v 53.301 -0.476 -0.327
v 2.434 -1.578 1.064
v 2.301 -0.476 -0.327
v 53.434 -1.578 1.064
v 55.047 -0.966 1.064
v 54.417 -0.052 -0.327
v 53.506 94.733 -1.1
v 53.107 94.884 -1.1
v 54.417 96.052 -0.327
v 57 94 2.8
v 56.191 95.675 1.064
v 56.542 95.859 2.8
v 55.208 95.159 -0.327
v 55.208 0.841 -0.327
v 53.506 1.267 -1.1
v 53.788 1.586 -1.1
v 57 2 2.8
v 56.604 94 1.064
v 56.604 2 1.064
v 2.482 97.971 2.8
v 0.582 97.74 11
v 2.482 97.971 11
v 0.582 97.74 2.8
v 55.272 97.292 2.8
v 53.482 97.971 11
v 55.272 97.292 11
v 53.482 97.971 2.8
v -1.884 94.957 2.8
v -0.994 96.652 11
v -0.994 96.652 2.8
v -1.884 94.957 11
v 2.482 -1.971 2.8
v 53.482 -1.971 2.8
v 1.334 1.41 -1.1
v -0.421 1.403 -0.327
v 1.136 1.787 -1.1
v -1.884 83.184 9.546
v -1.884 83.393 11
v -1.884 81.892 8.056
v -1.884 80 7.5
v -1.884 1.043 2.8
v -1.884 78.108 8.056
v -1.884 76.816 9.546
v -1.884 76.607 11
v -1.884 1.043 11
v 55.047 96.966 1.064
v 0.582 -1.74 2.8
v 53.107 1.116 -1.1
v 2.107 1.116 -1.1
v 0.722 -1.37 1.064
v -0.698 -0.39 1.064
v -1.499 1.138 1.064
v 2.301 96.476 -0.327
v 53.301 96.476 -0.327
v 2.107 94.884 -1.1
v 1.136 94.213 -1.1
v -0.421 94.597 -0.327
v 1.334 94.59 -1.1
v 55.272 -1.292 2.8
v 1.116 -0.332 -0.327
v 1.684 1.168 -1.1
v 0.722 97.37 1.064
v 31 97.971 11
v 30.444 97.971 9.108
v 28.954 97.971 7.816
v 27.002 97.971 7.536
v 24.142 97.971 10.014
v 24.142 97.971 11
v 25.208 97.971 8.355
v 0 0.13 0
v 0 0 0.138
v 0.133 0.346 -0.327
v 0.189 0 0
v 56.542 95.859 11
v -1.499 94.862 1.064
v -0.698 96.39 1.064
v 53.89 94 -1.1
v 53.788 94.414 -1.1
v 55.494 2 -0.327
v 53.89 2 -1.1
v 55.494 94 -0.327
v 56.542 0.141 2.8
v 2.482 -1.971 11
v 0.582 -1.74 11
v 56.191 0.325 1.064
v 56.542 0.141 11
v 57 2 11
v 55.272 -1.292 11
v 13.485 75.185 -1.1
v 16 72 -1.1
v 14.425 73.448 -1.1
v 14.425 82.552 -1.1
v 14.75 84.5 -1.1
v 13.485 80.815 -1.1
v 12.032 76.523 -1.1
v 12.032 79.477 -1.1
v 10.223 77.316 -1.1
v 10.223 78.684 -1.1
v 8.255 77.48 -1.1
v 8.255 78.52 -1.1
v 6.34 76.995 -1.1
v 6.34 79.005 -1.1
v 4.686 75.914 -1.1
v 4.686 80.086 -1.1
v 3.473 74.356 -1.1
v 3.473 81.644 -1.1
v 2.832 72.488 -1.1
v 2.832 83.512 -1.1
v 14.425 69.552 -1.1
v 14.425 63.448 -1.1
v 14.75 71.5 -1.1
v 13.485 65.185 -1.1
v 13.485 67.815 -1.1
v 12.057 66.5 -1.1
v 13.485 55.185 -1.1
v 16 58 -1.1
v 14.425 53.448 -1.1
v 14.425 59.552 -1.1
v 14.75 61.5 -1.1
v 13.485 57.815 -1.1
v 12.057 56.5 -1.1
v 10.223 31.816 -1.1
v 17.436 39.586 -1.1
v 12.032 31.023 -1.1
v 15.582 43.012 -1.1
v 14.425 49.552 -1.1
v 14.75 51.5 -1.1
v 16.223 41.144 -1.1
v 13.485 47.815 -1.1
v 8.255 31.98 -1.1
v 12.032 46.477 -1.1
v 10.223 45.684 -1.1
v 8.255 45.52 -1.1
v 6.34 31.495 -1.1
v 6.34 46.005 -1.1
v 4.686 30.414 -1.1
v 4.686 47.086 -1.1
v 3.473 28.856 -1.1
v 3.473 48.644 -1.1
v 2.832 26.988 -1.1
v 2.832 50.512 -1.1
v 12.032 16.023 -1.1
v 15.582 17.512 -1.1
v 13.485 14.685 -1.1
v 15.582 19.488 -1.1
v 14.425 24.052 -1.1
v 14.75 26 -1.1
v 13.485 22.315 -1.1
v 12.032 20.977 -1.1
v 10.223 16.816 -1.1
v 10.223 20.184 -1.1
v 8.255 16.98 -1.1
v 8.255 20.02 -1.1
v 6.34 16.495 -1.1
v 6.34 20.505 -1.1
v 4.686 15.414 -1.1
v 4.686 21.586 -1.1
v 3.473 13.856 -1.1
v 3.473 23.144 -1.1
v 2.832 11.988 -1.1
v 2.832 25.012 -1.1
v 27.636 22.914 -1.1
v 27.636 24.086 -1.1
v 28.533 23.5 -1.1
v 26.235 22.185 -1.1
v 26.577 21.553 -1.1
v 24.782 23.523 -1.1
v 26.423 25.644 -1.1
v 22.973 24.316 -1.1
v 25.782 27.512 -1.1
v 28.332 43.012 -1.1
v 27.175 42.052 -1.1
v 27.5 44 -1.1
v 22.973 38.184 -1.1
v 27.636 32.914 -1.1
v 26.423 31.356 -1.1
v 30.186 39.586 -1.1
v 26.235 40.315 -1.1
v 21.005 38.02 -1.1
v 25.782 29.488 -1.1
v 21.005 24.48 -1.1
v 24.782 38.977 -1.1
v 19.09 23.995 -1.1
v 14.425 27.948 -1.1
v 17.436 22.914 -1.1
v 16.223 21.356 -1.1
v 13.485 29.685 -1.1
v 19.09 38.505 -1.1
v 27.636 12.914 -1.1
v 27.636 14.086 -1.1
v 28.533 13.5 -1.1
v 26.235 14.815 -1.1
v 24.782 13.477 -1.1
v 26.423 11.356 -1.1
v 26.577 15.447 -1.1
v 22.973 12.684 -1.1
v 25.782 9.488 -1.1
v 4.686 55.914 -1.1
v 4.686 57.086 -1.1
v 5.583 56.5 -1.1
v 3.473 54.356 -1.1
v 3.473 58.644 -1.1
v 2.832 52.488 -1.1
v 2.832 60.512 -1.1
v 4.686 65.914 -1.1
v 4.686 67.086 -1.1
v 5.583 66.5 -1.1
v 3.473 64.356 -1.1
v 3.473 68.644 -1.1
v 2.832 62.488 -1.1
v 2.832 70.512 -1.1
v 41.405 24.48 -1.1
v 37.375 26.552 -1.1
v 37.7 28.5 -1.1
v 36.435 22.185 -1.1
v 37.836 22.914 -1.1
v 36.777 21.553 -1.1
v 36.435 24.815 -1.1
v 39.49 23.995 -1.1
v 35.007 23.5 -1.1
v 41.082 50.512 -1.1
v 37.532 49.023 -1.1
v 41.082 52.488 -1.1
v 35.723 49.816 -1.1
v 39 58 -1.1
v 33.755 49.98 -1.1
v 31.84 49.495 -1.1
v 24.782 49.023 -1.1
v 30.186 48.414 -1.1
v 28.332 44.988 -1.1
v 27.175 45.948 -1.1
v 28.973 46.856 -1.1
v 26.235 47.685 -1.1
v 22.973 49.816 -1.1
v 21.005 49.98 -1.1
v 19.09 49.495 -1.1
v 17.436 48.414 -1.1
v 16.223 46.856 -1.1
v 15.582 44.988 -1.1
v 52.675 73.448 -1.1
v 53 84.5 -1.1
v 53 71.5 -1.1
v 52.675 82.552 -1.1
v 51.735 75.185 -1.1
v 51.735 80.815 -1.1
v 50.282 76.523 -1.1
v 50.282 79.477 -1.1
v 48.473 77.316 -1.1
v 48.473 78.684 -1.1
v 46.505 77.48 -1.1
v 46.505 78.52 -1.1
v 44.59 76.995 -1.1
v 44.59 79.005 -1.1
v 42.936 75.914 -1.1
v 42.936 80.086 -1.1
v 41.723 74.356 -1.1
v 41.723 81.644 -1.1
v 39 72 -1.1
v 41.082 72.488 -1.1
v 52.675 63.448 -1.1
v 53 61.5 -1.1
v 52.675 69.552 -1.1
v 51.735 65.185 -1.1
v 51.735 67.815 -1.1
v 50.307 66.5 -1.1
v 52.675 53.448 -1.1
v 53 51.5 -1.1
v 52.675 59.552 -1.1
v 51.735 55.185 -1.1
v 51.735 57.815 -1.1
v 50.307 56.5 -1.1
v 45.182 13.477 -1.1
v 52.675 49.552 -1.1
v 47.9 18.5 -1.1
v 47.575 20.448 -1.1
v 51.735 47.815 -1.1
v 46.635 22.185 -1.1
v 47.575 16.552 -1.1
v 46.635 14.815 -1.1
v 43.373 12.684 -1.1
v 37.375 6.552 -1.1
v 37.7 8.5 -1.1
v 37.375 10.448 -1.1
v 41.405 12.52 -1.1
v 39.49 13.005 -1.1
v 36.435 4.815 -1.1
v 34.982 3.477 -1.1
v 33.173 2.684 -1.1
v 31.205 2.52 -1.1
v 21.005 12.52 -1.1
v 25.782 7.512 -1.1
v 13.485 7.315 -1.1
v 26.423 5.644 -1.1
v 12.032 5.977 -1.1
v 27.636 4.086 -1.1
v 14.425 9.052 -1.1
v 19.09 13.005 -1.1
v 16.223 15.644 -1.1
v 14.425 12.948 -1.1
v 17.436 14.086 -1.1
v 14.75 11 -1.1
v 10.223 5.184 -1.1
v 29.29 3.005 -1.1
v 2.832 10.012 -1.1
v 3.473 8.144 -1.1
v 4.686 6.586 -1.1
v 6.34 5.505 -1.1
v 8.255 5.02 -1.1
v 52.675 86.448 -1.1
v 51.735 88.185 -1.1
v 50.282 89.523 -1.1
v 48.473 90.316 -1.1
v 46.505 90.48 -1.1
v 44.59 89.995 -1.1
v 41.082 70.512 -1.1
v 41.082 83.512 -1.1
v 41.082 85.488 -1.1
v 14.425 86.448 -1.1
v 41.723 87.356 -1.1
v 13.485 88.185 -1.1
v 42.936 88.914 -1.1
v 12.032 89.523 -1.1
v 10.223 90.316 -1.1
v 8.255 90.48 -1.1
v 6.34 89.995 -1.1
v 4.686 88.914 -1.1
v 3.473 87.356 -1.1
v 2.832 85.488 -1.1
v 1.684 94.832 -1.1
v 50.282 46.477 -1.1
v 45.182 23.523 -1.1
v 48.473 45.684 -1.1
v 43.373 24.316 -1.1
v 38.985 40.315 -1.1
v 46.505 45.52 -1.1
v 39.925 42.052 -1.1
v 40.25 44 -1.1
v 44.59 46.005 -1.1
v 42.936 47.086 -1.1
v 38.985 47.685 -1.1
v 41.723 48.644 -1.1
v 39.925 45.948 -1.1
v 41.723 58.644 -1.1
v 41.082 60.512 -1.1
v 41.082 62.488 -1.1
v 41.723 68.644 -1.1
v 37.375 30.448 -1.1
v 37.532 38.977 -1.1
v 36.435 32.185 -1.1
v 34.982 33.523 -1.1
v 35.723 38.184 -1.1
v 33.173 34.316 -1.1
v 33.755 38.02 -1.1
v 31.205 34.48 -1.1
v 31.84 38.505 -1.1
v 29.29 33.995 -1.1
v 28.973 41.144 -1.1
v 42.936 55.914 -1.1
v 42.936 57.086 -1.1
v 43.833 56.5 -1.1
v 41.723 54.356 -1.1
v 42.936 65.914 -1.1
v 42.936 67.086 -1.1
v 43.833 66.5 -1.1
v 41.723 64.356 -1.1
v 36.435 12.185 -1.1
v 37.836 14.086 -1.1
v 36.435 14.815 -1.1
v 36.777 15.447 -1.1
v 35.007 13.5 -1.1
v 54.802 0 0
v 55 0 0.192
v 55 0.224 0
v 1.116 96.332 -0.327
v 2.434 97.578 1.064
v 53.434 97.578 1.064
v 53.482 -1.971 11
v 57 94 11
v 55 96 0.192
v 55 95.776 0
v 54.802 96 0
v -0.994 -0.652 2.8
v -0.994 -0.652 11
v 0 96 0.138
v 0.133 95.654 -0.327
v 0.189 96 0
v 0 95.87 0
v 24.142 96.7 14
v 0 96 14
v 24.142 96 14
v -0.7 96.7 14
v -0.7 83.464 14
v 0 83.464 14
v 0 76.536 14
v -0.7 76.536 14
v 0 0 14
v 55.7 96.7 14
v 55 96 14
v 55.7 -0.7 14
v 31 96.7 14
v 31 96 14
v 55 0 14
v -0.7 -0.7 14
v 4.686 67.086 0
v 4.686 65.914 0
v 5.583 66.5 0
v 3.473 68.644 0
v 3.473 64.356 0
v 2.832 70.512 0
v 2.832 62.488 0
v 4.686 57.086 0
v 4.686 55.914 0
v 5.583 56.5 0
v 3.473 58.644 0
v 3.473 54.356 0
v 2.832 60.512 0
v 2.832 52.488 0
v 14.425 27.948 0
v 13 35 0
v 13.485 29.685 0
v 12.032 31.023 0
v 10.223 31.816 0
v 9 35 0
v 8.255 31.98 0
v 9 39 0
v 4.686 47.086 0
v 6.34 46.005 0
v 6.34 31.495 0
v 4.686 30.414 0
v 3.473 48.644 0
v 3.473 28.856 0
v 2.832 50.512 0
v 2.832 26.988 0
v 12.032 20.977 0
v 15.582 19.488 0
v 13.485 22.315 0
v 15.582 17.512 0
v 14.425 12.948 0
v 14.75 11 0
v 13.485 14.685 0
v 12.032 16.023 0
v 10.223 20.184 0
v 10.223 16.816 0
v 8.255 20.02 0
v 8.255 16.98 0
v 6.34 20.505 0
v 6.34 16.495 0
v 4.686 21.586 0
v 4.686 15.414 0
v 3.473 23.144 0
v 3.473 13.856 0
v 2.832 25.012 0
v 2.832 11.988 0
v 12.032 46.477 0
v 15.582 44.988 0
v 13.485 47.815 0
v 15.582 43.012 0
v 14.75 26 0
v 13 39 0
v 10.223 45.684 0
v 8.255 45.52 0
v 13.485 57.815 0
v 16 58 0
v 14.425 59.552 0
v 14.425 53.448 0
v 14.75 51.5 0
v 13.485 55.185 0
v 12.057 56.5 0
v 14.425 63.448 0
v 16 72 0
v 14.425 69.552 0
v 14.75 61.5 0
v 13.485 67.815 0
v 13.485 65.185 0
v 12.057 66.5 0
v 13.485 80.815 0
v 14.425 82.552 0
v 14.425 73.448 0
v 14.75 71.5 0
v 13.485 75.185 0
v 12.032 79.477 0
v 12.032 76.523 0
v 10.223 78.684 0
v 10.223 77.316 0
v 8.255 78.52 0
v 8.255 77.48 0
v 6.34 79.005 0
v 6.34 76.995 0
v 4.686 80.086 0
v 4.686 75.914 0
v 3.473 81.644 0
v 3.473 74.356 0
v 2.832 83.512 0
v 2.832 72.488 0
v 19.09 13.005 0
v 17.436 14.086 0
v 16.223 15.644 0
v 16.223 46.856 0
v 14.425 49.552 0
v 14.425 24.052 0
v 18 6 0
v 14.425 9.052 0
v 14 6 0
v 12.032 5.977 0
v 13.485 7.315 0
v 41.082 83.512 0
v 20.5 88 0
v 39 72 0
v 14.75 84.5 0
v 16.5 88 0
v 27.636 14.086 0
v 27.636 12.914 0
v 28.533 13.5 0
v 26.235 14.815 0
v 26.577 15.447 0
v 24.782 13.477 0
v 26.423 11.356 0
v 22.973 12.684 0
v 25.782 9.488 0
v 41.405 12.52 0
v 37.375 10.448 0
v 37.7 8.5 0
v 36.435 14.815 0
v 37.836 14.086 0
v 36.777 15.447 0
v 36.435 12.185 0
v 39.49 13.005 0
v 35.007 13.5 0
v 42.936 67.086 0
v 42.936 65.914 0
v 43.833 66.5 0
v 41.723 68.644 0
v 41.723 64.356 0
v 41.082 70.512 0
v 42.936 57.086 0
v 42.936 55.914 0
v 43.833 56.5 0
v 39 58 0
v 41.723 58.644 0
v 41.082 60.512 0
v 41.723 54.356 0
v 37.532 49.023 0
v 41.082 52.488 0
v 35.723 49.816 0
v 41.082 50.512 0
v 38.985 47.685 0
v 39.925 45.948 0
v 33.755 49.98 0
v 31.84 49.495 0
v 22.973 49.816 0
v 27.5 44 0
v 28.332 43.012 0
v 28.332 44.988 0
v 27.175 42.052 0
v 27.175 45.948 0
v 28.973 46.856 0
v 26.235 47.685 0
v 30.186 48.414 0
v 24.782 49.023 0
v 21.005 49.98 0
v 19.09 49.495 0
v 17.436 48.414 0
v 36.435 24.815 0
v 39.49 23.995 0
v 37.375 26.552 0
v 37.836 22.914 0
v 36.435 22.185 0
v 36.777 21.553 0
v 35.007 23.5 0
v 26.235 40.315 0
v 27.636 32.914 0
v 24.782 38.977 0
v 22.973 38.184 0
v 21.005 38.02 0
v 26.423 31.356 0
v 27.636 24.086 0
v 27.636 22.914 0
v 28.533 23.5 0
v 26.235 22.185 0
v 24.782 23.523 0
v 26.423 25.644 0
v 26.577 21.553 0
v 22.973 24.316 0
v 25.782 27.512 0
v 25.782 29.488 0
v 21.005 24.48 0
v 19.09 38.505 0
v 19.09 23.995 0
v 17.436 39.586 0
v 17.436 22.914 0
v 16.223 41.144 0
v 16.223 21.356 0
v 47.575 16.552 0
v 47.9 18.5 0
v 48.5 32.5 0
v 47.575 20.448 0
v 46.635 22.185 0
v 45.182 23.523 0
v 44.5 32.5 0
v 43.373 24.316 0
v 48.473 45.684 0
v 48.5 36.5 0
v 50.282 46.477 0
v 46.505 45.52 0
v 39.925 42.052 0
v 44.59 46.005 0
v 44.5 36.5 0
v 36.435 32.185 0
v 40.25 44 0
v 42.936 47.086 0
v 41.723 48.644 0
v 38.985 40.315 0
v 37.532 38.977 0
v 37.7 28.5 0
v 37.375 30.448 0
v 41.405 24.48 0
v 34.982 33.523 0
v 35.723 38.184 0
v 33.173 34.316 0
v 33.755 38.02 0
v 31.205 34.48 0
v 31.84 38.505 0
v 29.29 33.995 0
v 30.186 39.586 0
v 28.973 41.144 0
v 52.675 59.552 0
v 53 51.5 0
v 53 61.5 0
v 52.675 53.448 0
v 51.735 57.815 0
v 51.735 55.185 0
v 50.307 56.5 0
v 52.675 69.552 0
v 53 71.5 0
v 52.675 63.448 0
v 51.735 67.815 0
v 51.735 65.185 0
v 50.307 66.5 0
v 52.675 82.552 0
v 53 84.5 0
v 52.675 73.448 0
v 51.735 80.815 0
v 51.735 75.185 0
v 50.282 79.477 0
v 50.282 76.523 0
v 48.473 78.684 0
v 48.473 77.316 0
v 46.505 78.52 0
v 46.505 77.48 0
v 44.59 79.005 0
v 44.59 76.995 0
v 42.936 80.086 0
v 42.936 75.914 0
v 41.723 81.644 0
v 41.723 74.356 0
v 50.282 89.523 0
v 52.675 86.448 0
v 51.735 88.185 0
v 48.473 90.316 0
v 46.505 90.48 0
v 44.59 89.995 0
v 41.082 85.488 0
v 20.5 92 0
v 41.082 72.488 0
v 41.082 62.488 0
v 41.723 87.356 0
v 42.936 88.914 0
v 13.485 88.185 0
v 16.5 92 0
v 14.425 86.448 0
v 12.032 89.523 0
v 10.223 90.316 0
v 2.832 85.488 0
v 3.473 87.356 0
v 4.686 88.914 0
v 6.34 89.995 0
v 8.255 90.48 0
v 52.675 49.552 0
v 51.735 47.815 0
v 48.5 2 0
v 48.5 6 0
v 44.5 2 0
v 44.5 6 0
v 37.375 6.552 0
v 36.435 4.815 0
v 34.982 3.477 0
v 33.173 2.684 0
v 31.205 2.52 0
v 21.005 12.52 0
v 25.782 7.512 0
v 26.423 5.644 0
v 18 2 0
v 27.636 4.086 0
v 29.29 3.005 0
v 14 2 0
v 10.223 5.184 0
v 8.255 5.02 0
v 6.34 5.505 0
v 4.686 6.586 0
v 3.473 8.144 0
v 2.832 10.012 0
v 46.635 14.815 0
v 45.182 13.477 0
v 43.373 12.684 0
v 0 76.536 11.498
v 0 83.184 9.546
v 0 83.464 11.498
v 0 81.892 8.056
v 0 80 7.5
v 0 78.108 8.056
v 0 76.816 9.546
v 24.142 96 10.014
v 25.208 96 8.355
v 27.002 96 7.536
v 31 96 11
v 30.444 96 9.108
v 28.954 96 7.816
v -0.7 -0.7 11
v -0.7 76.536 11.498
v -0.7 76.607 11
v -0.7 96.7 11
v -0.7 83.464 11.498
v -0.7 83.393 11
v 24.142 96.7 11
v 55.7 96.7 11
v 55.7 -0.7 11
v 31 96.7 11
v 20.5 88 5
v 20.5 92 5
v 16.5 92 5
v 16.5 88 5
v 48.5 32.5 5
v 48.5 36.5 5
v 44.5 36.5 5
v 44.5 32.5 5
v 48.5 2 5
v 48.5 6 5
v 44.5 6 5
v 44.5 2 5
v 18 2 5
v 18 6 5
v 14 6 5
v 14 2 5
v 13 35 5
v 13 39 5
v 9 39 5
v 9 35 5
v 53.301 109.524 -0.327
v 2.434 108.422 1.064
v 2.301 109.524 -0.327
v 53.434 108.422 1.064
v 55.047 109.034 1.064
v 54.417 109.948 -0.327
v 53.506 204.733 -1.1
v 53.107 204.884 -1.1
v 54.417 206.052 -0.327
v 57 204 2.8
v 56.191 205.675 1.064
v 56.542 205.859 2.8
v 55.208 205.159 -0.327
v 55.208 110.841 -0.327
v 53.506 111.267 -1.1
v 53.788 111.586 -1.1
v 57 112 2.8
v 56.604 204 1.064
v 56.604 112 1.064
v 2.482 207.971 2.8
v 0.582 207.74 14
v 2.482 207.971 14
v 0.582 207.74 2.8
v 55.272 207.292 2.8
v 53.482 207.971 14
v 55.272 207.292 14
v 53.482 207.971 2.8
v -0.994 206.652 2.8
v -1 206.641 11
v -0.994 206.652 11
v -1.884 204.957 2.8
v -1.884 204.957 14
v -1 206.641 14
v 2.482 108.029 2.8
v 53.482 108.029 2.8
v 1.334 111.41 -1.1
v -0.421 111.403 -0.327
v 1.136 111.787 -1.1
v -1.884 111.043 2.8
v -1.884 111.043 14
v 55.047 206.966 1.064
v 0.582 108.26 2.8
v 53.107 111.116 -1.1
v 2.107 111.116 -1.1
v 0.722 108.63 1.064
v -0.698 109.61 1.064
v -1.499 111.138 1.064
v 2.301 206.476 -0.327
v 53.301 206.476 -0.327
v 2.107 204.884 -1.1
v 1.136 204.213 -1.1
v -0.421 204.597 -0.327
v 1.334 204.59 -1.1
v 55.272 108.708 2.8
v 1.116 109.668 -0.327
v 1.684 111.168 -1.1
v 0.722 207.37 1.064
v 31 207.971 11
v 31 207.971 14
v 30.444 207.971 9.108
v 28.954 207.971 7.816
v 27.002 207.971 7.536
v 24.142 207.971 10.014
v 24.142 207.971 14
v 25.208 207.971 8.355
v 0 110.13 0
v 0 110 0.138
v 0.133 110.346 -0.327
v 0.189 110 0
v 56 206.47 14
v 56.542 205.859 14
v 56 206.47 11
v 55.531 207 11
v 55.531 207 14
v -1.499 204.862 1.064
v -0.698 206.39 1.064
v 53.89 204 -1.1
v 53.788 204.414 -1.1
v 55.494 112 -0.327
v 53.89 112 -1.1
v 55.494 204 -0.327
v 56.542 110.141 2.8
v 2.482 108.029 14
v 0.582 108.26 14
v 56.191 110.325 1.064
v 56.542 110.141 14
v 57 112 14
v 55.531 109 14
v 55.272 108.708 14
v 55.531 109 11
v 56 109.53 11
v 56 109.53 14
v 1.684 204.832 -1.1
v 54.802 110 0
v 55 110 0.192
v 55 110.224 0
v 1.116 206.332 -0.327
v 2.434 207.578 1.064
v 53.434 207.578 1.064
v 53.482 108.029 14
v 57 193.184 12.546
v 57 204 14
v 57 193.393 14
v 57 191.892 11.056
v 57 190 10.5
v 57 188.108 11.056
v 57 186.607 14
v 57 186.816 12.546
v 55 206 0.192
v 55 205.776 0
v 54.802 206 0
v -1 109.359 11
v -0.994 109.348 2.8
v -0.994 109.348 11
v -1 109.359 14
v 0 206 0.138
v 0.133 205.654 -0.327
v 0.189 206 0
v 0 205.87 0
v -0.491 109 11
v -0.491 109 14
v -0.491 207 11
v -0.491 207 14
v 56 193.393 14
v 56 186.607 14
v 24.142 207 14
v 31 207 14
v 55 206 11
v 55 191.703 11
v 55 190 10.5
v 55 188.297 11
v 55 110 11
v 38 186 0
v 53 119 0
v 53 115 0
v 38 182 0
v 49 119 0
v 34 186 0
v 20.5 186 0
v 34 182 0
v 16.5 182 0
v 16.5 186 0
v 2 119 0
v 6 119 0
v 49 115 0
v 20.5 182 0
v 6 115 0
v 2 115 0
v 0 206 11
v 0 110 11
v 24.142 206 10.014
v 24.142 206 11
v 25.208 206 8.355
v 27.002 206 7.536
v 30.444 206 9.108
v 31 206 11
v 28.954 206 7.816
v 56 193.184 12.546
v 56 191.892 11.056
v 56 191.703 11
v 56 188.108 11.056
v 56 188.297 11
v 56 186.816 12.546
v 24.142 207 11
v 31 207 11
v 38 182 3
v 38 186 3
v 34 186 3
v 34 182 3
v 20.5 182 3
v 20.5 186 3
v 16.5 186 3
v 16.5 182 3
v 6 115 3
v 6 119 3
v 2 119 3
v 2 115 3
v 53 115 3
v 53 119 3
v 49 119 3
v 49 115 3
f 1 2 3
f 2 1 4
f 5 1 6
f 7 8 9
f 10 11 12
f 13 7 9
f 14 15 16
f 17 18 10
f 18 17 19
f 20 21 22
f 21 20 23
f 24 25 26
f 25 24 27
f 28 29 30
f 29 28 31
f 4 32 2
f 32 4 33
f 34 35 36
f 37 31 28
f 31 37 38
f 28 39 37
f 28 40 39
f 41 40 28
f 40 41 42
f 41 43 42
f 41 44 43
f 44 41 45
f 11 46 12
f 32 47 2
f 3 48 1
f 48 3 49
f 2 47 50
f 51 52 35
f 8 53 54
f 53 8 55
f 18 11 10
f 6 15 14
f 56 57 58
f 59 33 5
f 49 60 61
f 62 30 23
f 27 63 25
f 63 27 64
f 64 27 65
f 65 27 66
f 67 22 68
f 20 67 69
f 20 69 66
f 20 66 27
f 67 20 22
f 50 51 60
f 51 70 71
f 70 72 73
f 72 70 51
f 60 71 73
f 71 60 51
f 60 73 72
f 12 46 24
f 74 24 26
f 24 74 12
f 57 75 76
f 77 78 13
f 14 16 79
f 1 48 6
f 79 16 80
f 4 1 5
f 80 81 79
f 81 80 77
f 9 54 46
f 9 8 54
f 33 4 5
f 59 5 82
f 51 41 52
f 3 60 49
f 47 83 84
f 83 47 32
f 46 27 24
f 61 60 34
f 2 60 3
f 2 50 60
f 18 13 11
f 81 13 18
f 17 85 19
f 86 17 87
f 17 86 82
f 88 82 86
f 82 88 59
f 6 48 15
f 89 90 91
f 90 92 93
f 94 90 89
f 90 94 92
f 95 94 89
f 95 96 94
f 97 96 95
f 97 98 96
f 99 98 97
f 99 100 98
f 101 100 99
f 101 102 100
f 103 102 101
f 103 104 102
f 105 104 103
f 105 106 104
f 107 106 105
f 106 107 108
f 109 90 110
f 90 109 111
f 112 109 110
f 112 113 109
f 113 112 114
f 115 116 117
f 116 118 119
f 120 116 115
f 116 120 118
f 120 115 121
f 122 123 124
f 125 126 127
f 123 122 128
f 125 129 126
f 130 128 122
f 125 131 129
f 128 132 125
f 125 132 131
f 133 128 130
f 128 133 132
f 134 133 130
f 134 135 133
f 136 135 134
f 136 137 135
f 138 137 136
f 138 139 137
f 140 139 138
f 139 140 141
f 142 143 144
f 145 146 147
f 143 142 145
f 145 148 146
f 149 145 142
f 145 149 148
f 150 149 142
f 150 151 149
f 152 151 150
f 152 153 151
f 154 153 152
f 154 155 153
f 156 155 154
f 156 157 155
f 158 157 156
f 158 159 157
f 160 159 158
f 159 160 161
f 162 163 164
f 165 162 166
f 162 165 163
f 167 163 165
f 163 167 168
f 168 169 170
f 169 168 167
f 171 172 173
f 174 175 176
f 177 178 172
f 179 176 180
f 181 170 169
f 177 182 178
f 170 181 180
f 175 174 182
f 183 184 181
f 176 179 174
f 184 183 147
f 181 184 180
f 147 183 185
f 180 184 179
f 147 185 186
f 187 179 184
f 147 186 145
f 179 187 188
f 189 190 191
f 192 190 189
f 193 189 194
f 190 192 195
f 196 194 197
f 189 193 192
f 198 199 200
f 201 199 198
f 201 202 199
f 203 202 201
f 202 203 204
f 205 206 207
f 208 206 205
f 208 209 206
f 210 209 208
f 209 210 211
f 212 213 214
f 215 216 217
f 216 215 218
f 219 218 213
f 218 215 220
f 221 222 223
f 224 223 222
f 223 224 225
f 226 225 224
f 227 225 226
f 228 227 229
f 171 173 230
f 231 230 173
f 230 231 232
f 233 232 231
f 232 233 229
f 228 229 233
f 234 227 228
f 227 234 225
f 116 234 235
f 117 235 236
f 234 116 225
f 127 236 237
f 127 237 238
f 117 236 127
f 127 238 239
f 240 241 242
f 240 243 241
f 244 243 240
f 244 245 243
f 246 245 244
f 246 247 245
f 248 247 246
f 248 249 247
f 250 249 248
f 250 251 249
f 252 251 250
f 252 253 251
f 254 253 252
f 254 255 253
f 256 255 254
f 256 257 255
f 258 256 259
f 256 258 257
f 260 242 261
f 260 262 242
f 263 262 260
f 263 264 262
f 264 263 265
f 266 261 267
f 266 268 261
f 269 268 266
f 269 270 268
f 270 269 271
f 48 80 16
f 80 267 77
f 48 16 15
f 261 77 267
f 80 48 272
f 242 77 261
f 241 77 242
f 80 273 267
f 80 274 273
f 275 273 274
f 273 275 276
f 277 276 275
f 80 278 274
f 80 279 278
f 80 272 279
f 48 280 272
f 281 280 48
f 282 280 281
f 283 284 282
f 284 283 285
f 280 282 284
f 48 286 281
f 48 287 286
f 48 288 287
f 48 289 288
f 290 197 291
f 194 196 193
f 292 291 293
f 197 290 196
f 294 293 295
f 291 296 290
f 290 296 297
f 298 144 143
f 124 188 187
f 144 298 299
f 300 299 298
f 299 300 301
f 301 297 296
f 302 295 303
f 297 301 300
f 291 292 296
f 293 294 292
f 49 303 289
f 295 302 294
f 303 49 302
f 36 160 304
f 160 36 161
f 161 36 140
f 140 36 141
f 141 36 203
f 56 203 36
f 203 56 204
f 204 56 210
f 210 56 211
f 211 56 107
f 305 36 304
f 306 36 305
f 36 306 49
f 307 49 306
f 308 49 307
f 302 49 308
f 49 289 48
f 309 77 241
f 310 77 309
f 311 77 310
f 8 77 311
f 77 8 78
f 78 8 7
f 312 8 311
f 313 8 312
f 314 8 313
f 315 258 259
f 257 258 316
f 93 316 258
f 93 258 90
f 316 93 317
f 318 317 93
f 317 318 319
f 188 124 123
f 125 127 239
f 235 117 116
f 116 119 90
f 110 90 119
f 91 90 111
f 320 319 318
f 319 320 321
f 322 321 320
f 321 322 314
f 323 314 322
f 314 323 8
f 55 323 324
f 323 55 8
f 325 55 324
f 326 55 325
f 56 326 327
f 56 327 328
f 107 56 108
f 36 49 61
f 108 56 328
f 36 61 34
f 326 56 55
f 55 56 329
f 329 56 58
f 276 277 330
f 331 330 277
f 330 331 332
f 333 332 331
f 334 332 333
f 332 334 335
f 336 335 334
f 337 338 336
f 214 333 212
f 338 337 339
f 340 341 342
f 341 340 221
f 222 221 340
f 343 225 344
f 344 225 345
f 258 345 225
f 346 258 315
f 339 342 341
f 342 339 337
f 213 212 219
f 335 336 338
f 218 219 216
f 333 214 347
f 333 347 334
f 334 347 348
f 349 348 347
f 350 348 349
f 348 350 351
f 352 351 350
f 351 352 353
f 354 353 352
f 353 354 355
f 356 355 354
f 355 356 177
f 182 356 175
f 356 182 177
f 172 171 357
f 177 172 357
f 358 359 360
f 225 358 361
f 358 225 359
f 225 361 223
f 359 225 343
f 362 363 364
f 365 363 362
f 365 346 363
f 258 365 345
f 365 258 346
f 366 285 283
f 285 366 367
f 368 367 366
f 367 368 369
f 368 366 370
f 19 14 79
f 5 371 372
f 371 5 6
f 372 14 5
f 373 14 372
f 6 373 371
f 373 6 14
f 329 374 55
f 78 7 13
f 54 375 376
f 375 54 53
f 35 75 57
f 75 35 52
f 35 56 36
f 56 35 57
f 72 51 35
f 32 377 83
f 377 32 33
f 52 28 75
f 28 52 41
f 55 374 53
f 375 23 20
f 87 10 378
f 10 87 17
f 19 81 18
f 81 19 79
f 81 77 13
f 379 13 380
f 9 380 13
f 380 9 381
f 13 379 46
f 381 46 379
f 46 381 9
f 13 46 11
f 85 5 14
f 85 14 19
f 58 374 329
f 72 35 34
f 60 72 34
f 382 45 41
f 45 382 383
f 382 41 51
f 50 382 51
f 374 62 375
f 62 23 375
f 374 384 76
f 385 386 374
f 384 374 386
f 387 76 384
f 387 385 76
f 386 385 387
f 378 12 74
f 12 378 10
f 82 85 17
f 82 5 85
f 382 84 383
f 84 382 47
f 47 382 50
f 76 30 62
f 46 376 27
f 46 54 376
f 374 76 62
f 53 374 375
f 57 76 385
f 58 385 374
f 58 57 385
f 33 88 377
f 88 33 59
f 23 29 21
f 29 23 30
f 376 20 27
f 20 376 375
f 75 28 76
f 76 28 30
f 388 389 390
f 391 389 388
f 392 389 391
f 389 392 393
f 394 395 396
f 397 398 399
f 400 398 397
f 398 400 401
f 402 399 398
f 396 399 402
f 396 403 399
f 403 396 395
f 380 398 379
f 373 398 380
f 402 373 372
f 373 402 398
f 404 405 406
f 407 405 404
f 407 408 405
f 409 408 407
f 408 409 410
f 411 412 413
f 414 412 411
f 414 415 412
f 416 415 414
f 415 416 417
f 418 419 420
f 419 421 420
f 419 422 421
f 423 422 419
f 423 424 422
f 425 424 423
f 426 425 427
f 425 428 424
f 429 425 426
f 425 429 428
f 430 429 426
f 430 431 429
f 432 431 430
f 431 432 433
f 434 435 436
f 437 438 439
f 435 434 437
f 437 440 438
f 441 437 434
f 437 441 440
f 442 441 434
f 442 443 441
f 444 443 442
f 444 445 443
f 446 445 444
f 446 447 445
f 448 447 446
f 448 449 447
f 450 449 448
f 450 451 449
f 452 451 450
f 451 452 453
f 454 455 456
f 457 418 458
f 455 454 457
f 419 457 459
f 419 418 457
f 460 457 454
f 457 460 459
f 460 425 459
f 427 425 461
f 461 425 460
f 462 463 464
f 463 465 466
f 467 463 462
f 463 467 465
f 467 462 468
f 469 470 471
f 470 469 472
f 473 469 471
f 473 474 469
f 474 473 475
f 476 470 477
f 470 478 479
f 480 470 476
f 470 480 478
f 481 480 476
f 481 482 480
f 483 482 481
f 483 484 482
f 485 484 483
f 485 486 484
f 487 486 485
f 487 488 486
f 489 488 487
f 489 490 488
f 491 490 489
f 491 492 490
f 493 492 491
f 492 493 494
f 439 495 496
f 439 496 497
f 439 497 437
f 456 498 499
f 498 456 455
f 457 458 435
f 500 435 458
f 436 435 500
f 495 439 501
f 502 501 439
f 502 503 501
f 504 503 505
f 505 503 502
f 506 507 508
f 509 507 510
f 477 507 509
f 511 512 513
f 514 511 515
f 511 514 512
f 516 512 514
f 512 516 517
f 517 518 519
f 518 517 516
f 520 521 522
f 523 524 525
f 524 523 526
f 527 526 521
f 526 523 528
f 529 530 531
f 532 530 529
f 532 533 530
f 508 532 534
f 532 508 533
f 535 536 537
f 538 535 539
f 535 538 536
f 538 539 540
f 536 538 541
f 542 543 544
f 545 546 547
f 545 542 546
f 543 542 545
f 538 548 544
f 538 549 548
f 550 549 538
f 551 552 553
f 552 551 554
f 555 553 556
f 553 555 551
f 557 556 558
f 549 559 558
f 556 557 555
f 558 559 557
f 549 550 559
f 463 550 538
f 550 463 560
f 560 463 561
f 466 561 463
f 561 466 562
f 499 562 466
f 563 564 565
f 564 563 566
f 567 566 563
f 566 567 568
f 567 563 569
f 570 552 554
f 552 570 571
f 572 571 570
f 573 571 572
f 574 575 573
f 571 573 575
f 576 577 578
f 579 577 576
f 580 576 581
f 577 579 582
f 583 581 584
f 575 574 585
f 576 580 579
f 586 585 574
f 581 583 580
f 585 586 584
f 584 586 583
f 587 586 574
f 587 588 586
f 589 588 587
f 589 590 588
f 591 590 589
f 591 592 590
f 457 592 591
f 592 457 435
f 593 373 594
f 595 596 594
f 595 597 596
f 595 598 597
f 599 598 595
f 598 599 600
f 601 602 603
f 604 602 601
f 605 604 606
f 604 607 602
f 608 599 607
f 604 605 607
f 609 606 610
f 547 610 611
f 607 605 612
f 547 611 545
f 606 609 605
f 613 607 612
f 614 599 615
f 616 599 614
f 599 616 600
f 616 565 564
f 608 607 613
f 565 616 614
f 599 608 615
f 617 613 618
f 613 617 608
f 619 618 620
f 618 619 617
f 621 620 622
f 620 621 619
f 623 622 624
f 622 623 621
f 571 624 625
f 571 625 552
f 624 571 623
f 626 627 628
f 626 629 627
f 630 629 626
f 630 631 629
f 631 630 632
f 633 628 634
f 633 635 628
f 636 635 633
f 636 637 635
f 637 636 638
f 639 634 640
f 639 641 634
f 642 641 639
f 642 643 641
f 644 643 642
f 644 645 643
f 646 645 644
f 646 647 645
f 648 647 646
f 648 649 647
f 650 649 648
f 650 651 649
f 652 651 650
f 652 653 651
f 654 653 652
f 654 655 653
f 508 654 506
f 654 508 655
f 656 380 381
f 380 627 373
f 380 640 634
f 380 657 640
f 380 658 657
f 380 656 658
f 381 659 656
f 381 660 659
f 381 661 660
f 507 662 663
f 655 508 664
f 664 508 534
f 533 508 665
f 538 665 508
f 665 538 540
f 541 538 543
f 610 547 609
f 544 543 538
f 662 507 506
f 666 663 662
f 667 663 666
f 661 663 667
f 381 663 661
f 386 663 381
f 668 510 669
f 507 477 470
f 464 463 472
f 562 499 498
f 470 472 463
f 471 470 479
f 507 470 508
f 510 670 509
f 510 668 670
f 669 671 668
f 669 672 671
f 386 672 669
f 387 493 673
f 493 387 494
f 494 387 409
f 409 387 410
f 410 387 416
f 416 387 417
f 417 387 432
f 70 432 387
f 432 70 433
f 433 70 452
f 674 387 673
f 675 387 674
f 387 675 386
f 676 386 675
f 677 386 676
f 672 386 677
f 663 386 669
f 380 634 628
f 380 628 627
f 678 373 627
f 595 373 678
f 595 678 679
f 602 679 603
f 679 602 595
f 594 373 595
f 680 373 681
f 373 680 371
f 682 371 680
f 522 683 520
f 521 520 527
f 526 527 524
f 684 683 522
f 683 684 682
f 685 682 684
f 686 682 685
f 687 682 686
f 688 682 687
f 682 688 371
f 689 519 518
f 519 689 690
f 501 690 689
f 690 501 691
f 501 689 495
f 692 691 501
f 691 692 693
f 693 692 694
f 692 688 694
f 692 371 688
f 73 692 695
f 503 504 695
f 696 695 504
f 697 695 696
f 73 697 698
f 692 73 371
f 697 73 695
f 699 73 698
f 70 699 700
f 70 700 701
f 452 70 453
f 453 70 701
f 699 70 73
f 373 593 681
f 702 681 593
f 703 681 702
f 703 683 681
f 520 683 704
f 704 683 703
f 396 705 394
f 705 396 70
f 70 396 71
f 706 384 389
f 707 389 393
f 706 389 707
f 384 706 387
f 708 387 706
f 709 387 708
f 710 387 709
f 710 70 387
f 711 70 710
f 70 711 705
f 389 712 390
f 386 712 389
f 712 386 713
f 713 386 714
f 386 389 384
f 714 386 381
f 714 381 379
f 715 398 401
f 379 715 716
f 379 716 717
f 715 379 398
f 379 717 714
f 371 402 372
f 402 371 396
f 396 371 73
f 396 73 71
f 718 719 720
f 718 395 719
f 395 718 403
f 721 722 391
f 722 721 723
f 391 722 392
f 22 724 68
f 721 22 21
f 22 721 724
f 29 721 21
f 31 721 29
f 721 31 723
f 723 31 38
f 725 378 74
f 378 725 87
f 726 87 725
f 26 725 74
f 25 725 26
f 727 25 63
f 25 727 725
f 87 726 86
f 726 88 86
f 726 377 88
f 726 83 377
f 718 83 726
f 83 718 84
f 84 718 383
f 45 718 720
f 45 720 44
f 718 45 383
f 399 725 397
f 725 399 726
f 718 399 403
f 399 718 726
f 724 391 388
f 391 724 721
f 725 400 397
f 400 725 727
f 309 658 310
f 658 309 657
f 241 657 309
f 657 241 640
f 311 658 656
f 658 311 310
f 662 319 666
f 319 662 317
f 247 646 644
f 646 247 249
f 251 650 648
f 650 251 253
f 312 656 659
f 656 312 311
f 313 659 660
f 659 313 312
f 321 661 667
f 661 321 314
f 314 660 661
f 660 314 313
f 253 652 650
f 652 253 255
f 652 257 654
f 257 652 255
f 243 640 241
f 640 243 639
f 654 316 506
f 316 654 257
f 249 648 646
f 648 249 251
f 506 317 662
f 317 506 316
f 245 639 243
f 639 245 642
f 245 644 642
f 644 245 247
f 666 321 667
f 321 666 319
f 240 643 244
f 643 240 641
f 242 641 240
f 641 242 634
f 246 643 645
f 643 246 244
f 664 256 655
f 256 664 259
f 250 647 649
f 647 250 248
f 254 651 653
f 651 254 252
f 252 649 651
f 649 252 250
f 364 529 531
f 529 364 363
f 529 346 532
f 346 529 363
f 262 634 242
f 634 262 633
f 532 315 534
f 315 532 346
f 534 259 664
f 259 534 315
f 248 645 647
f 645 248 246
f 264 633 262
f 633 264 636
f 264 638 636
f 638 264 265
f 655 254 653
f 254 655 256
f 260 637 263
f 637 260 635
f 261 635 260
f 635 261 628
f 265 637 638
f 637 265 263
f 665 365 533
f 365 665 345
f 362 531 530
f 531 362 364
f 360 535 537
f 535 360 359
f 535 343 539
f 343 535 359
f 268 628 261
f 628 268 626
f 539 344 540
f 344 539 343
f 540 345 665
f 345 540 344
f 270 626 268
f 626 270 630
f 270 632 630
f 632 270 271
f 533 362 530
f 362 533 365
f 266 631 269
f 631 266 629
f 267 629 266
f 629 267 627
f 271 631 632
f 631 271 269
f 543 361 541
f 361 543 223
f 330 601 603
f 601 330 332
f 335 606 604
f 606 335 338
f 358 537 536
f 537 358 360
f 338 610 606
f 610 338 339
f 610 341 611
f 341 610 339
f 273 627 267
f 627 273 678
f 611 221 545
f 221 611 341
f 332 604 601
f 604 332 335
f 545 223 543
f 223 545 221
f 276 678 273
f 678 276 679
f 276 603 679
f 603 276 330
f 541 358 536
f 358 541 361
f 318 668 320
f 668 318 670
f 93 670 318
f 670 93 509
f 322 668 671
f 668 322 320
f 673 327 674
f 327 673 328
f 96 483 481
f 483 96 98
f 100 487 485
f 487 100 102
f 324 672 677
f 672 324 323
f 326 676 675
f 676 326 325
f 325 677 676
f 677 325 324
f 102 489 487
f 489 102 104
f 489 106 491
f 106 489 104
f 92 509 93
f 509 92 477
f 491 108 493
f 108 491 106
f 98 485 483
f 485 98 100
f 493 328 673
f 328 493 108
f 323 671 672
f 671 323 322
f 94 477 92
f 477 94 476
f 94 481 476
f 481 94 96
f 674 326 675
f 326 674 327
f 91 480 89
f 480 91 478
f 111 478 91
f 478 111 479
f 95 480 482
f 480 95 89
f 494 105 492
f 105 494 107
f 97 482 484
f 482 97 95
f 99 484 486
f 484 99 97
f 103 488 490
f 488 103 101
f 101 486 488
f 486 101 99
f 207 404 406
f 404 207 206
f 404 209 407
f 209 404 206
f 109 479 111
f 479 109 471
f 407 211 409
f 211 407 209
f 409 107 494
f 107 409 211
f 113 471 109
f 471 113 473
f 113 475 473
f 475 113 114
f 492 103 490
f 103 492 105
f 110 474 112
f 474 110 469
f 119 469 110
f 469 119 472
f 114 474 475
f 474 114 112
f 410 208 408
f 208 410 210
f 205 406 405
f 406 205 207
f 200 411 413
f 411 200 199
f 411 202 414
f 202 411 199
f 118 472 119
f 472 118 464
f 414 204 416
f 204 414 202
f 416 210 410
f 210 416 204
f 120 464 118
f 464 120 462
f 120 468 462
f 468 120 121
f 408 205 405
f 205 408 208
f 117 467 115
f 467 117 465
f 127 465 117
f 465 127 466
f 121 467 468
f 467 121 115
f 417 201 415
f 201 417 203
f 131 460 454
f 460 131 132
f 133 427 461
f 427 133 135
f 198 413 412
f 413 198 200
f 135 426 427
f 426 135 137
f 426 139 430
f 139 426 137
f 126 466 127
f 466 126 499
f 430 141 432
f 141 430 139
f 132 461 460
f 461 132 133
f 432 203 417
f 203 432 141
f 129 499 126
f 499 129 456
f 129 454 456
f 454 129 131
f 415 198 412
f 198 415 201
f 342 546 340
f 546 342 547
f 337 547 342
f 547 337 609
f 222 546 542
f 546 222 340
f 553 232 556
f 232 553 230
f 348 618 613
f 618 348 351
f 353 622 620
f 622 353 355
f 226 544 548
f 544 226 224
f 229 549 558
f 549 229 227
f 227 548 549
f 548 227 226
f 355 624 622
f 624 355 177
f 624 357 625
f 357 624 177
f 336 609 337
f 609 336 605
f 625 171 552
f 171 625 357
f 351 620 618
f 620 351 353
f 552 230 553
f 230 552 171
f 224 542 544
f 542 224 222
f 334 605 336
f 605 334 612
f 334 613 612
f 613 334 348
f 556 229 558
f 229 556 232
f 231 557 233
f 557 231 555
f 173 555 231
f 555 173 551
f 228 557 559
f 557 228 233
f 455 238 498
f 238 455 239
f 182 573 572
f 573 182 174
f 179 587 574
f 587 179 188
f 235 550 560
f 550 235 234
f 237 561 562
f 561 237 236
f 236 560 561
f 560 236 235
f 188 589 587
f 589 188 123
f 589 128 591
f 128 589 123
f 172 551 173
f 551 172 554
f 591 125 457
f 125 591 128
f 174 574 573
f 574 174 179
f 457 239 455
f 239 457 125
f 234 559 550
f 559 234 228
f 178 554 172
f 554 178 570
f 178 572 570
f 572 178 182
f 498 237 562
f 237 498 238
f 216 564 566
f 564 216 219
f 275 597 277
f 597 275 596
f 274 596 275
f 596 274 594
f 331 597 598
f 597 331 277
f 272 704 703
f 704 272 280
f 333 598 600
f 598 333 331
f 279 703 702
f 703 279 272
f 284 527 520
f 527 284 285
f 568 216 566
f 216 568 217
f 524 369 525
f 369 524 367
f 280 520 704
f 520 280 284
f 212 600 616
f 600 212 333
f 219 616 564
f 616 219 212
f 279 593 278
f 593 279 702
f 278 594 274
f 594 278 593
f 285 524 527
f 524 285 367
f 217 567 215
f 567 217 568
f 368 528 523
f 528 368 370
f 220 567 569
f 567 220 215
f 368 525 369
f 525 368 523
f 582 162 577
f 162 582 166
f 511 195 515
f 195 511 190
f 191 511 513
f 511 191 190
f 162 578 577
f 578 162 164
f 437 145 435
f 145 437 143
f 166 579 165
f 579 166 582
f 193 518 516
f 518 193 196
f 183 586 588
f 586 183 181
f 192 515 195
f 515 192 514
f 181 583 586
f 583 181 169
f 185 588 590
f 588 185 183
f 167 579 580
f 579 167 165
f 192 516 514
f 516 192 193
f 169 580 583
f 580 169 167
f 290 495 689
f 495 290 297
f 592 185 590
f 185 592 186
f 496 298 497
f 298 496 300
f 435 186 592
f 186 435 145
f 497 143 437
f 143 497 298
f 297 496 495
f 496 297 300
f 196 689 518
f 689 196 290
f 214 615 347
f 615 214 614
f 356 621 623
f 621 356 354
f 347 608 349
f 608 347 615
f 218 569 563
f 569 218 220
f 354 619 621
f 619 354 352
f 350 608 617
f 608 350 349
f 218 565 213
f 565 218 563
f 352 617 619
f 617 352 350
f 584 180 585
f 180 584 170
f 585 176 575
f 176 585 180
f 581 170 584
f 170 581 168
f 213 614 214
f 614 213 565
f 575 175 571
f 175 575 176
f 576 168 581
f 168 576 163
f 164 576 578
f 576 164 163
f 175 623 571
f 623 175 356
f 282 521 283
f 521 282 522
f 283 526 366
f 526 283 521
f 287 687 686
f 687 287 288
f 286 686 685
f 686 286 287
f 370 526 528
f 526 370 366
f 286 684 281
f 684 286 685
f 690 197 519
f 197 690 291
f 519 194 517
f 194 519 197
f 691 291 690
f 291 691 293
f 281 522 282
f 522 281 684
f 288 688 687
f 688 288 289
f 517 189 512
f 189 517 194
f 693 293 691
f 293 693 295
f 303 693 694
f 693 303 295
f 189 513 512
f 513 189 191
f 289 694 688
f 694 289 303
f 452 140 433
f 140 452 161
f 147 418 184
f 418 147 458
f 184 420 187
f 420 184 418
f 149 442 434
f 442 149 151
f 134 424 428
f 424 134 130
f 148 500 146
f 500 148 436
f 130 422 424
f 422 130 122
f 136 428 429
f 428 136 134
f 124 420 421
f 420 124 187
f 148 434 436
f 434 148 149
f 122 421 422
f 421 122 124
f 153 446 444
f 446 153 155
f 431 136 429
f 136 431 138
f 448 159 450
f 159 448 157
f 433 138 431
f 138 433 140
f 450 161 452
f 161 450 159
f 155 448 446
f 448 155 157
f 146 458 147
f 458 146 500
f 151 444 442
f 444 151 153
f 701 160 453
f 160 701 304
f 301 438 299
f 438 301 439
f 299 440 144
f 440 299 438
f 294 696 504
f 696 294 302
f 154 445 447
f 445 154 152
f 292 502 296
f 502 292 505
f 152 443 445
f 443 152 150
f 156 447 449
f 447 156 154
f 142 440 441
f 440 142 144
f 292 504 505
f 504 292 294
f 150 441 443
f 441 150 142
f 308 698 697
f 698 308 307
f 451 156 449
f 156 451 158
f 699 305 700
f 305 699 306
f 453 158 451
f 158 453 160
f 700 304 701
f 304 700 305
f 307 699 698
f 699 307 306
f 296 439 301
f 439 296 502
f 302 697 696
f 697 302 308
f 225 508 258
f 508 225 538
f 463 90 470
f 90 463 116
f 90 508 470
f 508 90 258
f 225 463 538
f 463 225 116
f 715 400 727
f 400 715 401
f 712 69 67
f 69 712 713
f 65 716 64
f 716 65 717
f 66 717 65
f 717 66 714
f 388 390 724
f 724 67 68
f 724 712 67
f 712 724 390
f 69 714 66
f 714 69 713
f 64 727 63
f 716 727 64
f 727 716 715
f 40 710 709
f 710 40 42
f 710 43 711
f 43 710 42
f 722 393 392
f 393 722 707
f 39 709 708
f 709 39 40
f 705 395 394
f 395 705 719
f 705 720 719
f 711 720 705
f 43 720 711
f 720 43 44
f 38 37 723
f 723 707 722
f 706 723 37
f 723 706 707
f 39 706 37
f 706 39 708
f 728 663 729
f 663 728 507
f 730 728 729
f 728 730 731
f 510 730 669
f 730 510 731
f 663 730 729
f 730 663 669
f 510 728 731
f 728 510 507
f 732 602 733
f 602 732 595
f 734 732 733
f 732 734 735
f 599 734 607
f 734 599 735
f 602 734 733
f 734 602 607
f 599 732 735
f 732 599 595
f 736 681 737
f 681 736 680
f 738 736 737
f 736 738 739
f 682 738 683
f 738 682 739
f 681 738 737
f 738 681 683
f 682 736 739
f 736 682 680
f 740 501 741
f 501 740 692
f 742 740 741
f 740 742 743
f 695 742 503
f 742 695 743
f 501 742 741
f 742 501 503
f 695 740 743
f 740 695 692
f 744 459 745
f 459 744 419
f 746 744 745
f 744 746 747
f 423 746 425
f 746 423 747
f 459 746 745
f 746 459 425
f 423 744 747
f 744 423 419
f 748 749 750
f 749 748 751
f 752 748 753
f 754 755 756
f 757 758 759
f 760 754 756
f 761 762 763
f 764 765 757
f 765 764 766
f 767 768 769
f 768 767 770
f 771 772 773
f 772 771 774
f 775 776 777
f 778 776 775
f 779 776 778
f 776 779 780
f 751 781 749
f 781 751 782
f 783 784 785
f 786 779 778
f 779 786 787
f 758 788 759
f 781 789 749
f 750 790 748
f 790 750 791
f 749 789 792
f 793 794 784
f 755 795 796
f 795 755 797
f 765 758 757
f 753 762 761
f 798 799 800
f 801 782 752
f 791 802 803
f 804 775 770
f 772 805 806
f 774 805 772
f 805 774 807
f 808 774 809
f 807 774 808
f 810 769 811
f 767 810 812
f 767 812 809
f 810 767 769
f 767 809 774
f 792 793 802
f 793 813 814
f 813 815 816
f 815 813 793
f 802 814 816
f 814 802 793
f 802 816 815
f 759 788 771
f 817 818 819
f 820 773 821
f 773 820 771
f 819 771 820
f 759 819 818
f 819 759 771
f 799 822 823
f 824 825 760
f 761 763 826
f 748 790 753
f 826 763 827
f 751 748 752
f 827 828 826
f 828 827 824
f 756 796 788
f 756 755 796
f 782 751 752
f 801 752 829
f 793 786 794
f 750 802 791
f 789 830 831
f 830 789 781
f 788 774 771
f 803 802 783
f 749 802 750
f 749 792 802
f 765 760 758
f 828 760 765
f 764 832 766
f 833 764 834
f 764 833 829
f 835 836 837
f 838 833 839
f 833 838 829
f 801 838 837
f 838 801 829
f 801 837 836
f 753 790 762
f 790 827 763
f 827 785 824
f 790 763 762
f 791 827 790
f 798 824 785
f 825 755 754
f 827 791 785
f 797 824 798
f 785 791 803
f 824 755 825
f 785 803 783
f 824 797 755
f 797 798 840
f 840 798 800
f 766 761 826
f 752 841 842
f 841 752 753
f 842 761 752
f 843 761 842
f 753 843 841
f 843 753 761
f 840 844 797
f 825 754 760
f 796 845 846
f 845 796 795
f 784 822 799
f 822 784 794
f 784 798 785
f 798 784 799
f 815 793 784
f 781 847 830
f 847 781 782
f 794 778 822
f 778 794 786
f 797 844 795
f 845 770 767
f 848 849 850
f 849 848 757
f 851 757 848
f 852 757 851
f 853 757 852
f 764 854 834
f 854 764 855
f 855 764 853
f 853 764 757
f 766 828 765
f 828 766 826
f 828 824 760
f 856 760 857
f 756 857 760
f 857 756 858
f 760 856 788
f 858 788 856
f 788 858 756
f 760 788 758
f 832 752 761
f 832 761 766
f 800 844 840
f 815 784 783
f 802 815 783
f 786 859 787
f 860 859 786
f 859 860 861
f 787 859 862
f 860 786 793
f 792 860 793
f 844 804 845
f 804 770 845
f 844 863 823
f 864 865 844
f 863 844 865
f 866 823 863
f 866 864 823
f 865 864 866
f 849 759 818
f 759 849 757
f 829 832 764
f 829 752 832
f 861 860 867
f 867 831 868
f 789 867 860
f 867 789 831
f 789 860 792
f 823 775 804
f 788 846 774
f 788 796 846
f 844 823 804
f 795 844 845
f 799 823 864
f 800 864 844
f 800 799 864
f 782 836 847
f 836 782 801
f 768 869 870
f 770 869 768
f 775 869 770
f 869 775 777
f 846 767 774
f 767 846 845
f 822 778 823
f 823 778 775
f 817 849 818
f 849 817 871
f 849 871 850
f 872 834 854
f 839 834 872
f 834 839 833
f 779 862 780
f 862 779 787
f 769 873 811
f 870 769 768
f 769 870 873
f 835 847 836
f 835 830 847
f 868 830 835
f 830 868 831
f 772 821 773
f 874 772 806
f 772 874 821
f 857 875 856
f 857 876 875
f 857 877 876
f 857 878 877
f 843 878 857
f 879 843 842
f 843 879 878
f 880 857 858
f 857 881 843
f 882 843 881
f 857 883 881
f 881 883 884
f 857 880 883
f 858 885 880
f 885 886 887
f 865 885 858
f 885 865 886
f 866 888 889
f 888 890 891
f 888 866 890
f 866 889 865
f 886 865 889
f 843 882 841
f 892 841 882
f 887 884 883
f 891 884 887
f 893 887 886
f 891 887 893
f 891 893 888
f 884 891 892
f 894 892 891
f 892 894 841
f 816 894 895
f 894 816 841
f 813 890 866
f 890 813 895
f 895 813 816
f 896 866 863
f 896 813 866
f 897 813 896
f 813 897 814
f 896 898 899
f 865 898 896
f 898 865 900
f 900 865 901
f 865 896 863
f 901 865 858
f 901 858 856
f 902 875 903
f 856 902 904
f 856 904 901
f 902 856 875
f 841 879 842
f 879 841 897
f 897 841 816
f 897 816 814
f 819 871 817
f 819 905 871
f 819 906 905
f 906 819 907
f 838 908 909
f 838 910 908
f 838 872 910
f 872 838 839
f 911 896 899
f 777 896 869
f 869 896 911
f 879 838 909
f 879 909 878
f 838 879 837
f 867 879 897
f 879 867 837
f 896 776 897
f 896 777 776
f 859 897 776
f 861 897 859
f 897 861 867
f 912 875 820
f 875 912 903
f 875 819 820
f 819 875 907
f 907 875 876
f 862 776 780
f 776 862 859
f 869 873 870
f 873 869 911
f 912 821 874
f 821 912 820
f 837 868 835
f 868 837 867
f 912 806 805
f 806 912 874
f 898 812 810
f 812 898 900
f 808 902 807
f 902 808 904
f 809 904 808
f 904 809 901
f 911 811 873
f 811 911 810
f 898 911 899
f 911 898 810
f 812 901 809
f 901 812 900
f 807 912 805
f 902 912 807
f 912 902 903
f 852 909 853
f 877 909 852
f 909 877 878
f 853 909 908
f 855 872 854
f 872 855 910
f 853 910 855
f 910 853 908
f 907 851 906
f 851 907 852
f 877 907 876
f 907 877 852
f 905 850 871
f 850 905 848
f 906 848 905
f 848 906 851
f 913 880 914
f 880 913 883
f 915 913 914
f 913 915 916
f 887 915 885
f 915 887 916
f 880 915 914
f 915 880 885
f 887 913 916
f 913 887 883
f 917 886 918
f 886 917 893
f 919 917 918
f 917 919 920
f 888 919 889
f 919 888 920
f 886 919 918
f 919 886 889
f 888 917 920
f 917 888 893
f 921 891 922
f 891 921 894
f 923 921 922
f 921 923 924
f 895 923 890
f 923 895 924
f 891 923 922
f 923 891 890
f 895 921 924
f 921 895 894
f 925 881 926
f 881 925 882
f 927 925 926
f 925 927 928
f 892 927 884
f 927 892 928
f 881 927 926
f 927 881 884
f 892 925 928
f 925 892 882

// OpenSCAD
// TODO

thickness = 2;
sheet = 1.2;
overlap = 3;
width = 55;
length = 96;
height = 14;

radius = 4;


module rounded( width, length, height, radius )
{
    module roundedFlat()
    {
        hull() {
            translate( [radius,radius,radius] ) sphere( r=radius );
            translate( [width-radius,radius,radius] ) sphere( r=radius );
            translate( [radius,length-radius,radius] ) sphere( r=radius );
            translate( [width-radius,length-radius,radius] ) sphere( r=radius );
        }
    }

    hull() {
        roundedFlat();
        translate( [0,0, height - radius * 2] ) roundedFlat();
    }
}

module post( x, y, size=4, height=3 )
{
    translate( [x-size/2,y-size/2,0] ) {
        cube( [size, size, height] );
    }
}

module case()
{
    translate( [-thickness, -thickness, -sheet] ) 
    intersection() {
        rounded( width + thickness* 2, length + thickness*2, height*2, radius );
        cube( [ width + thickness* 2, length + thickness*2, height+sheet ] );
    }
}

module powerSwitchHole( left=0 )
{
    translate([width-left*width,80,height - left*overlap]) rotate([0,90,0])
    hull() {
        cylinder( d=7, h=10, center=true );
        translate([-10,0,0]) rotate([0,90,0]) cylinder( d=7, h=10, center=true );
    }
}

module buttonHole( x, y )
{
    translate( [width -x, y, -sheet/2] ) cylinder( d=12, h=sheet*2, center=true );
}

module ledHole( left=0 )
{
    translate([ width/2, length, height]) rotate( [90,0,0] ) hull() {
        cylinder( d=7, h=10, center=true );
        translate([0,-3,0]) cylinder( d=7, h=10, center=true );
    }
}

module base()
{    
    difference() {
        case();

        cube( [width, length, height*2] );
        translate([-thickness/2, -thickness/2,height-overlap]) cube( [width+thickness, length+thickness, overlap+1] );
        
        ledHole();
        powerSwitchHole();
    }

    post( 36, 74 );
    post( 18.5, 74 );
    post( 4, 7 );
    post( width-4, 7 );
}

module top()
{
    slack=0.3;
    
    pitch = 2.55;
    col1 = 8;
    col2 = col1 + 2 * pitch;
    col3 = col1 + 5 * pitch;
    col4 = col1 + 6 * pitch;
    col5 = col1 + 10 * pitch;
    col6 = col1 + 15 * pitch;

    echo( "col6", col6, "was 47" );
    
    row1 = 8.5;
    row2 = row1 + pitch;
    row3 = row1 + pitch * 2;
    row4 = row1 + pitch * 8;
    row5 = row1 + pitch * 14;
    row6 = row1 + pitch * 17;
    row7 = row1 + pitch * 21;
    row8 = row1 + pitch * 25;
    row9 = row1 + pitch * 30;
    echo( "row 8", row8, "was 71" );
    
    difference() {
        case();

        cube( [width, length, height*2] ); // Inside

        translate([-10-thickness/2+slack,-thickness,height-overlap])
            cube( [10,length+10, thickness*2] ); // Left edge

        translate([width+thickness/2-slack,-thickness,height-overlap])
            cube( [10,length+10, thickness*2] ); // Right edge

        translate([-5,-10-thickness/2+slack,height-overlap])
            cube( [width+10,10, thickness*2] ) ;// Bottom edge

        translate([-5,length+thickness/2-slack,height-overlap])
            cube( [width+10,10, thickness*2] ); // Top edge

        // Top Left buttons
        buttonHole( col1, 84.5 );
        buttonHole( col1, 71.5 );
        buttonHole( col1, 61.5 );
        buttonHole( col1, 51.5 );

        // Top Right buttons
        buttonHole( col6, 84.5 );
        buttonHole( col6, 71.5 );
        buttonHole( col6, 61.5 );
        buttonHole( col6, 51.5 );

        // Left/Right buttons
        buttonHole( col3, 44 );
        buttonHole( col5, 44 );

        // Direction buttons
        buttonHole( col2, 18.5 );
        buttonHole( col4, 18.5 );
        buttonHole( col5, 18.5 );
        buttonHole( col4, 28.5 );
        buttonHole( col4, 8.5 );

        // Volumne buttons
        buttonHole( col6, 26 );        
        buttonHole( col6, 11 );        

        // Screen
        translate( [16, 58, -height] ) cube( [width-16*2,14, height*2] );

        ledHole(1);
        powerSwitchHole(1);

    }

    post( 18.5, 90, height=5 );
    post( 46.5, 34.5, height=5 );
    post( 46.5, 4, height=5 );
    post( 16, 4, height=5 );
    post( 11, 37, height=5 );
}

top();
translate( [0,110,0] ) base();
